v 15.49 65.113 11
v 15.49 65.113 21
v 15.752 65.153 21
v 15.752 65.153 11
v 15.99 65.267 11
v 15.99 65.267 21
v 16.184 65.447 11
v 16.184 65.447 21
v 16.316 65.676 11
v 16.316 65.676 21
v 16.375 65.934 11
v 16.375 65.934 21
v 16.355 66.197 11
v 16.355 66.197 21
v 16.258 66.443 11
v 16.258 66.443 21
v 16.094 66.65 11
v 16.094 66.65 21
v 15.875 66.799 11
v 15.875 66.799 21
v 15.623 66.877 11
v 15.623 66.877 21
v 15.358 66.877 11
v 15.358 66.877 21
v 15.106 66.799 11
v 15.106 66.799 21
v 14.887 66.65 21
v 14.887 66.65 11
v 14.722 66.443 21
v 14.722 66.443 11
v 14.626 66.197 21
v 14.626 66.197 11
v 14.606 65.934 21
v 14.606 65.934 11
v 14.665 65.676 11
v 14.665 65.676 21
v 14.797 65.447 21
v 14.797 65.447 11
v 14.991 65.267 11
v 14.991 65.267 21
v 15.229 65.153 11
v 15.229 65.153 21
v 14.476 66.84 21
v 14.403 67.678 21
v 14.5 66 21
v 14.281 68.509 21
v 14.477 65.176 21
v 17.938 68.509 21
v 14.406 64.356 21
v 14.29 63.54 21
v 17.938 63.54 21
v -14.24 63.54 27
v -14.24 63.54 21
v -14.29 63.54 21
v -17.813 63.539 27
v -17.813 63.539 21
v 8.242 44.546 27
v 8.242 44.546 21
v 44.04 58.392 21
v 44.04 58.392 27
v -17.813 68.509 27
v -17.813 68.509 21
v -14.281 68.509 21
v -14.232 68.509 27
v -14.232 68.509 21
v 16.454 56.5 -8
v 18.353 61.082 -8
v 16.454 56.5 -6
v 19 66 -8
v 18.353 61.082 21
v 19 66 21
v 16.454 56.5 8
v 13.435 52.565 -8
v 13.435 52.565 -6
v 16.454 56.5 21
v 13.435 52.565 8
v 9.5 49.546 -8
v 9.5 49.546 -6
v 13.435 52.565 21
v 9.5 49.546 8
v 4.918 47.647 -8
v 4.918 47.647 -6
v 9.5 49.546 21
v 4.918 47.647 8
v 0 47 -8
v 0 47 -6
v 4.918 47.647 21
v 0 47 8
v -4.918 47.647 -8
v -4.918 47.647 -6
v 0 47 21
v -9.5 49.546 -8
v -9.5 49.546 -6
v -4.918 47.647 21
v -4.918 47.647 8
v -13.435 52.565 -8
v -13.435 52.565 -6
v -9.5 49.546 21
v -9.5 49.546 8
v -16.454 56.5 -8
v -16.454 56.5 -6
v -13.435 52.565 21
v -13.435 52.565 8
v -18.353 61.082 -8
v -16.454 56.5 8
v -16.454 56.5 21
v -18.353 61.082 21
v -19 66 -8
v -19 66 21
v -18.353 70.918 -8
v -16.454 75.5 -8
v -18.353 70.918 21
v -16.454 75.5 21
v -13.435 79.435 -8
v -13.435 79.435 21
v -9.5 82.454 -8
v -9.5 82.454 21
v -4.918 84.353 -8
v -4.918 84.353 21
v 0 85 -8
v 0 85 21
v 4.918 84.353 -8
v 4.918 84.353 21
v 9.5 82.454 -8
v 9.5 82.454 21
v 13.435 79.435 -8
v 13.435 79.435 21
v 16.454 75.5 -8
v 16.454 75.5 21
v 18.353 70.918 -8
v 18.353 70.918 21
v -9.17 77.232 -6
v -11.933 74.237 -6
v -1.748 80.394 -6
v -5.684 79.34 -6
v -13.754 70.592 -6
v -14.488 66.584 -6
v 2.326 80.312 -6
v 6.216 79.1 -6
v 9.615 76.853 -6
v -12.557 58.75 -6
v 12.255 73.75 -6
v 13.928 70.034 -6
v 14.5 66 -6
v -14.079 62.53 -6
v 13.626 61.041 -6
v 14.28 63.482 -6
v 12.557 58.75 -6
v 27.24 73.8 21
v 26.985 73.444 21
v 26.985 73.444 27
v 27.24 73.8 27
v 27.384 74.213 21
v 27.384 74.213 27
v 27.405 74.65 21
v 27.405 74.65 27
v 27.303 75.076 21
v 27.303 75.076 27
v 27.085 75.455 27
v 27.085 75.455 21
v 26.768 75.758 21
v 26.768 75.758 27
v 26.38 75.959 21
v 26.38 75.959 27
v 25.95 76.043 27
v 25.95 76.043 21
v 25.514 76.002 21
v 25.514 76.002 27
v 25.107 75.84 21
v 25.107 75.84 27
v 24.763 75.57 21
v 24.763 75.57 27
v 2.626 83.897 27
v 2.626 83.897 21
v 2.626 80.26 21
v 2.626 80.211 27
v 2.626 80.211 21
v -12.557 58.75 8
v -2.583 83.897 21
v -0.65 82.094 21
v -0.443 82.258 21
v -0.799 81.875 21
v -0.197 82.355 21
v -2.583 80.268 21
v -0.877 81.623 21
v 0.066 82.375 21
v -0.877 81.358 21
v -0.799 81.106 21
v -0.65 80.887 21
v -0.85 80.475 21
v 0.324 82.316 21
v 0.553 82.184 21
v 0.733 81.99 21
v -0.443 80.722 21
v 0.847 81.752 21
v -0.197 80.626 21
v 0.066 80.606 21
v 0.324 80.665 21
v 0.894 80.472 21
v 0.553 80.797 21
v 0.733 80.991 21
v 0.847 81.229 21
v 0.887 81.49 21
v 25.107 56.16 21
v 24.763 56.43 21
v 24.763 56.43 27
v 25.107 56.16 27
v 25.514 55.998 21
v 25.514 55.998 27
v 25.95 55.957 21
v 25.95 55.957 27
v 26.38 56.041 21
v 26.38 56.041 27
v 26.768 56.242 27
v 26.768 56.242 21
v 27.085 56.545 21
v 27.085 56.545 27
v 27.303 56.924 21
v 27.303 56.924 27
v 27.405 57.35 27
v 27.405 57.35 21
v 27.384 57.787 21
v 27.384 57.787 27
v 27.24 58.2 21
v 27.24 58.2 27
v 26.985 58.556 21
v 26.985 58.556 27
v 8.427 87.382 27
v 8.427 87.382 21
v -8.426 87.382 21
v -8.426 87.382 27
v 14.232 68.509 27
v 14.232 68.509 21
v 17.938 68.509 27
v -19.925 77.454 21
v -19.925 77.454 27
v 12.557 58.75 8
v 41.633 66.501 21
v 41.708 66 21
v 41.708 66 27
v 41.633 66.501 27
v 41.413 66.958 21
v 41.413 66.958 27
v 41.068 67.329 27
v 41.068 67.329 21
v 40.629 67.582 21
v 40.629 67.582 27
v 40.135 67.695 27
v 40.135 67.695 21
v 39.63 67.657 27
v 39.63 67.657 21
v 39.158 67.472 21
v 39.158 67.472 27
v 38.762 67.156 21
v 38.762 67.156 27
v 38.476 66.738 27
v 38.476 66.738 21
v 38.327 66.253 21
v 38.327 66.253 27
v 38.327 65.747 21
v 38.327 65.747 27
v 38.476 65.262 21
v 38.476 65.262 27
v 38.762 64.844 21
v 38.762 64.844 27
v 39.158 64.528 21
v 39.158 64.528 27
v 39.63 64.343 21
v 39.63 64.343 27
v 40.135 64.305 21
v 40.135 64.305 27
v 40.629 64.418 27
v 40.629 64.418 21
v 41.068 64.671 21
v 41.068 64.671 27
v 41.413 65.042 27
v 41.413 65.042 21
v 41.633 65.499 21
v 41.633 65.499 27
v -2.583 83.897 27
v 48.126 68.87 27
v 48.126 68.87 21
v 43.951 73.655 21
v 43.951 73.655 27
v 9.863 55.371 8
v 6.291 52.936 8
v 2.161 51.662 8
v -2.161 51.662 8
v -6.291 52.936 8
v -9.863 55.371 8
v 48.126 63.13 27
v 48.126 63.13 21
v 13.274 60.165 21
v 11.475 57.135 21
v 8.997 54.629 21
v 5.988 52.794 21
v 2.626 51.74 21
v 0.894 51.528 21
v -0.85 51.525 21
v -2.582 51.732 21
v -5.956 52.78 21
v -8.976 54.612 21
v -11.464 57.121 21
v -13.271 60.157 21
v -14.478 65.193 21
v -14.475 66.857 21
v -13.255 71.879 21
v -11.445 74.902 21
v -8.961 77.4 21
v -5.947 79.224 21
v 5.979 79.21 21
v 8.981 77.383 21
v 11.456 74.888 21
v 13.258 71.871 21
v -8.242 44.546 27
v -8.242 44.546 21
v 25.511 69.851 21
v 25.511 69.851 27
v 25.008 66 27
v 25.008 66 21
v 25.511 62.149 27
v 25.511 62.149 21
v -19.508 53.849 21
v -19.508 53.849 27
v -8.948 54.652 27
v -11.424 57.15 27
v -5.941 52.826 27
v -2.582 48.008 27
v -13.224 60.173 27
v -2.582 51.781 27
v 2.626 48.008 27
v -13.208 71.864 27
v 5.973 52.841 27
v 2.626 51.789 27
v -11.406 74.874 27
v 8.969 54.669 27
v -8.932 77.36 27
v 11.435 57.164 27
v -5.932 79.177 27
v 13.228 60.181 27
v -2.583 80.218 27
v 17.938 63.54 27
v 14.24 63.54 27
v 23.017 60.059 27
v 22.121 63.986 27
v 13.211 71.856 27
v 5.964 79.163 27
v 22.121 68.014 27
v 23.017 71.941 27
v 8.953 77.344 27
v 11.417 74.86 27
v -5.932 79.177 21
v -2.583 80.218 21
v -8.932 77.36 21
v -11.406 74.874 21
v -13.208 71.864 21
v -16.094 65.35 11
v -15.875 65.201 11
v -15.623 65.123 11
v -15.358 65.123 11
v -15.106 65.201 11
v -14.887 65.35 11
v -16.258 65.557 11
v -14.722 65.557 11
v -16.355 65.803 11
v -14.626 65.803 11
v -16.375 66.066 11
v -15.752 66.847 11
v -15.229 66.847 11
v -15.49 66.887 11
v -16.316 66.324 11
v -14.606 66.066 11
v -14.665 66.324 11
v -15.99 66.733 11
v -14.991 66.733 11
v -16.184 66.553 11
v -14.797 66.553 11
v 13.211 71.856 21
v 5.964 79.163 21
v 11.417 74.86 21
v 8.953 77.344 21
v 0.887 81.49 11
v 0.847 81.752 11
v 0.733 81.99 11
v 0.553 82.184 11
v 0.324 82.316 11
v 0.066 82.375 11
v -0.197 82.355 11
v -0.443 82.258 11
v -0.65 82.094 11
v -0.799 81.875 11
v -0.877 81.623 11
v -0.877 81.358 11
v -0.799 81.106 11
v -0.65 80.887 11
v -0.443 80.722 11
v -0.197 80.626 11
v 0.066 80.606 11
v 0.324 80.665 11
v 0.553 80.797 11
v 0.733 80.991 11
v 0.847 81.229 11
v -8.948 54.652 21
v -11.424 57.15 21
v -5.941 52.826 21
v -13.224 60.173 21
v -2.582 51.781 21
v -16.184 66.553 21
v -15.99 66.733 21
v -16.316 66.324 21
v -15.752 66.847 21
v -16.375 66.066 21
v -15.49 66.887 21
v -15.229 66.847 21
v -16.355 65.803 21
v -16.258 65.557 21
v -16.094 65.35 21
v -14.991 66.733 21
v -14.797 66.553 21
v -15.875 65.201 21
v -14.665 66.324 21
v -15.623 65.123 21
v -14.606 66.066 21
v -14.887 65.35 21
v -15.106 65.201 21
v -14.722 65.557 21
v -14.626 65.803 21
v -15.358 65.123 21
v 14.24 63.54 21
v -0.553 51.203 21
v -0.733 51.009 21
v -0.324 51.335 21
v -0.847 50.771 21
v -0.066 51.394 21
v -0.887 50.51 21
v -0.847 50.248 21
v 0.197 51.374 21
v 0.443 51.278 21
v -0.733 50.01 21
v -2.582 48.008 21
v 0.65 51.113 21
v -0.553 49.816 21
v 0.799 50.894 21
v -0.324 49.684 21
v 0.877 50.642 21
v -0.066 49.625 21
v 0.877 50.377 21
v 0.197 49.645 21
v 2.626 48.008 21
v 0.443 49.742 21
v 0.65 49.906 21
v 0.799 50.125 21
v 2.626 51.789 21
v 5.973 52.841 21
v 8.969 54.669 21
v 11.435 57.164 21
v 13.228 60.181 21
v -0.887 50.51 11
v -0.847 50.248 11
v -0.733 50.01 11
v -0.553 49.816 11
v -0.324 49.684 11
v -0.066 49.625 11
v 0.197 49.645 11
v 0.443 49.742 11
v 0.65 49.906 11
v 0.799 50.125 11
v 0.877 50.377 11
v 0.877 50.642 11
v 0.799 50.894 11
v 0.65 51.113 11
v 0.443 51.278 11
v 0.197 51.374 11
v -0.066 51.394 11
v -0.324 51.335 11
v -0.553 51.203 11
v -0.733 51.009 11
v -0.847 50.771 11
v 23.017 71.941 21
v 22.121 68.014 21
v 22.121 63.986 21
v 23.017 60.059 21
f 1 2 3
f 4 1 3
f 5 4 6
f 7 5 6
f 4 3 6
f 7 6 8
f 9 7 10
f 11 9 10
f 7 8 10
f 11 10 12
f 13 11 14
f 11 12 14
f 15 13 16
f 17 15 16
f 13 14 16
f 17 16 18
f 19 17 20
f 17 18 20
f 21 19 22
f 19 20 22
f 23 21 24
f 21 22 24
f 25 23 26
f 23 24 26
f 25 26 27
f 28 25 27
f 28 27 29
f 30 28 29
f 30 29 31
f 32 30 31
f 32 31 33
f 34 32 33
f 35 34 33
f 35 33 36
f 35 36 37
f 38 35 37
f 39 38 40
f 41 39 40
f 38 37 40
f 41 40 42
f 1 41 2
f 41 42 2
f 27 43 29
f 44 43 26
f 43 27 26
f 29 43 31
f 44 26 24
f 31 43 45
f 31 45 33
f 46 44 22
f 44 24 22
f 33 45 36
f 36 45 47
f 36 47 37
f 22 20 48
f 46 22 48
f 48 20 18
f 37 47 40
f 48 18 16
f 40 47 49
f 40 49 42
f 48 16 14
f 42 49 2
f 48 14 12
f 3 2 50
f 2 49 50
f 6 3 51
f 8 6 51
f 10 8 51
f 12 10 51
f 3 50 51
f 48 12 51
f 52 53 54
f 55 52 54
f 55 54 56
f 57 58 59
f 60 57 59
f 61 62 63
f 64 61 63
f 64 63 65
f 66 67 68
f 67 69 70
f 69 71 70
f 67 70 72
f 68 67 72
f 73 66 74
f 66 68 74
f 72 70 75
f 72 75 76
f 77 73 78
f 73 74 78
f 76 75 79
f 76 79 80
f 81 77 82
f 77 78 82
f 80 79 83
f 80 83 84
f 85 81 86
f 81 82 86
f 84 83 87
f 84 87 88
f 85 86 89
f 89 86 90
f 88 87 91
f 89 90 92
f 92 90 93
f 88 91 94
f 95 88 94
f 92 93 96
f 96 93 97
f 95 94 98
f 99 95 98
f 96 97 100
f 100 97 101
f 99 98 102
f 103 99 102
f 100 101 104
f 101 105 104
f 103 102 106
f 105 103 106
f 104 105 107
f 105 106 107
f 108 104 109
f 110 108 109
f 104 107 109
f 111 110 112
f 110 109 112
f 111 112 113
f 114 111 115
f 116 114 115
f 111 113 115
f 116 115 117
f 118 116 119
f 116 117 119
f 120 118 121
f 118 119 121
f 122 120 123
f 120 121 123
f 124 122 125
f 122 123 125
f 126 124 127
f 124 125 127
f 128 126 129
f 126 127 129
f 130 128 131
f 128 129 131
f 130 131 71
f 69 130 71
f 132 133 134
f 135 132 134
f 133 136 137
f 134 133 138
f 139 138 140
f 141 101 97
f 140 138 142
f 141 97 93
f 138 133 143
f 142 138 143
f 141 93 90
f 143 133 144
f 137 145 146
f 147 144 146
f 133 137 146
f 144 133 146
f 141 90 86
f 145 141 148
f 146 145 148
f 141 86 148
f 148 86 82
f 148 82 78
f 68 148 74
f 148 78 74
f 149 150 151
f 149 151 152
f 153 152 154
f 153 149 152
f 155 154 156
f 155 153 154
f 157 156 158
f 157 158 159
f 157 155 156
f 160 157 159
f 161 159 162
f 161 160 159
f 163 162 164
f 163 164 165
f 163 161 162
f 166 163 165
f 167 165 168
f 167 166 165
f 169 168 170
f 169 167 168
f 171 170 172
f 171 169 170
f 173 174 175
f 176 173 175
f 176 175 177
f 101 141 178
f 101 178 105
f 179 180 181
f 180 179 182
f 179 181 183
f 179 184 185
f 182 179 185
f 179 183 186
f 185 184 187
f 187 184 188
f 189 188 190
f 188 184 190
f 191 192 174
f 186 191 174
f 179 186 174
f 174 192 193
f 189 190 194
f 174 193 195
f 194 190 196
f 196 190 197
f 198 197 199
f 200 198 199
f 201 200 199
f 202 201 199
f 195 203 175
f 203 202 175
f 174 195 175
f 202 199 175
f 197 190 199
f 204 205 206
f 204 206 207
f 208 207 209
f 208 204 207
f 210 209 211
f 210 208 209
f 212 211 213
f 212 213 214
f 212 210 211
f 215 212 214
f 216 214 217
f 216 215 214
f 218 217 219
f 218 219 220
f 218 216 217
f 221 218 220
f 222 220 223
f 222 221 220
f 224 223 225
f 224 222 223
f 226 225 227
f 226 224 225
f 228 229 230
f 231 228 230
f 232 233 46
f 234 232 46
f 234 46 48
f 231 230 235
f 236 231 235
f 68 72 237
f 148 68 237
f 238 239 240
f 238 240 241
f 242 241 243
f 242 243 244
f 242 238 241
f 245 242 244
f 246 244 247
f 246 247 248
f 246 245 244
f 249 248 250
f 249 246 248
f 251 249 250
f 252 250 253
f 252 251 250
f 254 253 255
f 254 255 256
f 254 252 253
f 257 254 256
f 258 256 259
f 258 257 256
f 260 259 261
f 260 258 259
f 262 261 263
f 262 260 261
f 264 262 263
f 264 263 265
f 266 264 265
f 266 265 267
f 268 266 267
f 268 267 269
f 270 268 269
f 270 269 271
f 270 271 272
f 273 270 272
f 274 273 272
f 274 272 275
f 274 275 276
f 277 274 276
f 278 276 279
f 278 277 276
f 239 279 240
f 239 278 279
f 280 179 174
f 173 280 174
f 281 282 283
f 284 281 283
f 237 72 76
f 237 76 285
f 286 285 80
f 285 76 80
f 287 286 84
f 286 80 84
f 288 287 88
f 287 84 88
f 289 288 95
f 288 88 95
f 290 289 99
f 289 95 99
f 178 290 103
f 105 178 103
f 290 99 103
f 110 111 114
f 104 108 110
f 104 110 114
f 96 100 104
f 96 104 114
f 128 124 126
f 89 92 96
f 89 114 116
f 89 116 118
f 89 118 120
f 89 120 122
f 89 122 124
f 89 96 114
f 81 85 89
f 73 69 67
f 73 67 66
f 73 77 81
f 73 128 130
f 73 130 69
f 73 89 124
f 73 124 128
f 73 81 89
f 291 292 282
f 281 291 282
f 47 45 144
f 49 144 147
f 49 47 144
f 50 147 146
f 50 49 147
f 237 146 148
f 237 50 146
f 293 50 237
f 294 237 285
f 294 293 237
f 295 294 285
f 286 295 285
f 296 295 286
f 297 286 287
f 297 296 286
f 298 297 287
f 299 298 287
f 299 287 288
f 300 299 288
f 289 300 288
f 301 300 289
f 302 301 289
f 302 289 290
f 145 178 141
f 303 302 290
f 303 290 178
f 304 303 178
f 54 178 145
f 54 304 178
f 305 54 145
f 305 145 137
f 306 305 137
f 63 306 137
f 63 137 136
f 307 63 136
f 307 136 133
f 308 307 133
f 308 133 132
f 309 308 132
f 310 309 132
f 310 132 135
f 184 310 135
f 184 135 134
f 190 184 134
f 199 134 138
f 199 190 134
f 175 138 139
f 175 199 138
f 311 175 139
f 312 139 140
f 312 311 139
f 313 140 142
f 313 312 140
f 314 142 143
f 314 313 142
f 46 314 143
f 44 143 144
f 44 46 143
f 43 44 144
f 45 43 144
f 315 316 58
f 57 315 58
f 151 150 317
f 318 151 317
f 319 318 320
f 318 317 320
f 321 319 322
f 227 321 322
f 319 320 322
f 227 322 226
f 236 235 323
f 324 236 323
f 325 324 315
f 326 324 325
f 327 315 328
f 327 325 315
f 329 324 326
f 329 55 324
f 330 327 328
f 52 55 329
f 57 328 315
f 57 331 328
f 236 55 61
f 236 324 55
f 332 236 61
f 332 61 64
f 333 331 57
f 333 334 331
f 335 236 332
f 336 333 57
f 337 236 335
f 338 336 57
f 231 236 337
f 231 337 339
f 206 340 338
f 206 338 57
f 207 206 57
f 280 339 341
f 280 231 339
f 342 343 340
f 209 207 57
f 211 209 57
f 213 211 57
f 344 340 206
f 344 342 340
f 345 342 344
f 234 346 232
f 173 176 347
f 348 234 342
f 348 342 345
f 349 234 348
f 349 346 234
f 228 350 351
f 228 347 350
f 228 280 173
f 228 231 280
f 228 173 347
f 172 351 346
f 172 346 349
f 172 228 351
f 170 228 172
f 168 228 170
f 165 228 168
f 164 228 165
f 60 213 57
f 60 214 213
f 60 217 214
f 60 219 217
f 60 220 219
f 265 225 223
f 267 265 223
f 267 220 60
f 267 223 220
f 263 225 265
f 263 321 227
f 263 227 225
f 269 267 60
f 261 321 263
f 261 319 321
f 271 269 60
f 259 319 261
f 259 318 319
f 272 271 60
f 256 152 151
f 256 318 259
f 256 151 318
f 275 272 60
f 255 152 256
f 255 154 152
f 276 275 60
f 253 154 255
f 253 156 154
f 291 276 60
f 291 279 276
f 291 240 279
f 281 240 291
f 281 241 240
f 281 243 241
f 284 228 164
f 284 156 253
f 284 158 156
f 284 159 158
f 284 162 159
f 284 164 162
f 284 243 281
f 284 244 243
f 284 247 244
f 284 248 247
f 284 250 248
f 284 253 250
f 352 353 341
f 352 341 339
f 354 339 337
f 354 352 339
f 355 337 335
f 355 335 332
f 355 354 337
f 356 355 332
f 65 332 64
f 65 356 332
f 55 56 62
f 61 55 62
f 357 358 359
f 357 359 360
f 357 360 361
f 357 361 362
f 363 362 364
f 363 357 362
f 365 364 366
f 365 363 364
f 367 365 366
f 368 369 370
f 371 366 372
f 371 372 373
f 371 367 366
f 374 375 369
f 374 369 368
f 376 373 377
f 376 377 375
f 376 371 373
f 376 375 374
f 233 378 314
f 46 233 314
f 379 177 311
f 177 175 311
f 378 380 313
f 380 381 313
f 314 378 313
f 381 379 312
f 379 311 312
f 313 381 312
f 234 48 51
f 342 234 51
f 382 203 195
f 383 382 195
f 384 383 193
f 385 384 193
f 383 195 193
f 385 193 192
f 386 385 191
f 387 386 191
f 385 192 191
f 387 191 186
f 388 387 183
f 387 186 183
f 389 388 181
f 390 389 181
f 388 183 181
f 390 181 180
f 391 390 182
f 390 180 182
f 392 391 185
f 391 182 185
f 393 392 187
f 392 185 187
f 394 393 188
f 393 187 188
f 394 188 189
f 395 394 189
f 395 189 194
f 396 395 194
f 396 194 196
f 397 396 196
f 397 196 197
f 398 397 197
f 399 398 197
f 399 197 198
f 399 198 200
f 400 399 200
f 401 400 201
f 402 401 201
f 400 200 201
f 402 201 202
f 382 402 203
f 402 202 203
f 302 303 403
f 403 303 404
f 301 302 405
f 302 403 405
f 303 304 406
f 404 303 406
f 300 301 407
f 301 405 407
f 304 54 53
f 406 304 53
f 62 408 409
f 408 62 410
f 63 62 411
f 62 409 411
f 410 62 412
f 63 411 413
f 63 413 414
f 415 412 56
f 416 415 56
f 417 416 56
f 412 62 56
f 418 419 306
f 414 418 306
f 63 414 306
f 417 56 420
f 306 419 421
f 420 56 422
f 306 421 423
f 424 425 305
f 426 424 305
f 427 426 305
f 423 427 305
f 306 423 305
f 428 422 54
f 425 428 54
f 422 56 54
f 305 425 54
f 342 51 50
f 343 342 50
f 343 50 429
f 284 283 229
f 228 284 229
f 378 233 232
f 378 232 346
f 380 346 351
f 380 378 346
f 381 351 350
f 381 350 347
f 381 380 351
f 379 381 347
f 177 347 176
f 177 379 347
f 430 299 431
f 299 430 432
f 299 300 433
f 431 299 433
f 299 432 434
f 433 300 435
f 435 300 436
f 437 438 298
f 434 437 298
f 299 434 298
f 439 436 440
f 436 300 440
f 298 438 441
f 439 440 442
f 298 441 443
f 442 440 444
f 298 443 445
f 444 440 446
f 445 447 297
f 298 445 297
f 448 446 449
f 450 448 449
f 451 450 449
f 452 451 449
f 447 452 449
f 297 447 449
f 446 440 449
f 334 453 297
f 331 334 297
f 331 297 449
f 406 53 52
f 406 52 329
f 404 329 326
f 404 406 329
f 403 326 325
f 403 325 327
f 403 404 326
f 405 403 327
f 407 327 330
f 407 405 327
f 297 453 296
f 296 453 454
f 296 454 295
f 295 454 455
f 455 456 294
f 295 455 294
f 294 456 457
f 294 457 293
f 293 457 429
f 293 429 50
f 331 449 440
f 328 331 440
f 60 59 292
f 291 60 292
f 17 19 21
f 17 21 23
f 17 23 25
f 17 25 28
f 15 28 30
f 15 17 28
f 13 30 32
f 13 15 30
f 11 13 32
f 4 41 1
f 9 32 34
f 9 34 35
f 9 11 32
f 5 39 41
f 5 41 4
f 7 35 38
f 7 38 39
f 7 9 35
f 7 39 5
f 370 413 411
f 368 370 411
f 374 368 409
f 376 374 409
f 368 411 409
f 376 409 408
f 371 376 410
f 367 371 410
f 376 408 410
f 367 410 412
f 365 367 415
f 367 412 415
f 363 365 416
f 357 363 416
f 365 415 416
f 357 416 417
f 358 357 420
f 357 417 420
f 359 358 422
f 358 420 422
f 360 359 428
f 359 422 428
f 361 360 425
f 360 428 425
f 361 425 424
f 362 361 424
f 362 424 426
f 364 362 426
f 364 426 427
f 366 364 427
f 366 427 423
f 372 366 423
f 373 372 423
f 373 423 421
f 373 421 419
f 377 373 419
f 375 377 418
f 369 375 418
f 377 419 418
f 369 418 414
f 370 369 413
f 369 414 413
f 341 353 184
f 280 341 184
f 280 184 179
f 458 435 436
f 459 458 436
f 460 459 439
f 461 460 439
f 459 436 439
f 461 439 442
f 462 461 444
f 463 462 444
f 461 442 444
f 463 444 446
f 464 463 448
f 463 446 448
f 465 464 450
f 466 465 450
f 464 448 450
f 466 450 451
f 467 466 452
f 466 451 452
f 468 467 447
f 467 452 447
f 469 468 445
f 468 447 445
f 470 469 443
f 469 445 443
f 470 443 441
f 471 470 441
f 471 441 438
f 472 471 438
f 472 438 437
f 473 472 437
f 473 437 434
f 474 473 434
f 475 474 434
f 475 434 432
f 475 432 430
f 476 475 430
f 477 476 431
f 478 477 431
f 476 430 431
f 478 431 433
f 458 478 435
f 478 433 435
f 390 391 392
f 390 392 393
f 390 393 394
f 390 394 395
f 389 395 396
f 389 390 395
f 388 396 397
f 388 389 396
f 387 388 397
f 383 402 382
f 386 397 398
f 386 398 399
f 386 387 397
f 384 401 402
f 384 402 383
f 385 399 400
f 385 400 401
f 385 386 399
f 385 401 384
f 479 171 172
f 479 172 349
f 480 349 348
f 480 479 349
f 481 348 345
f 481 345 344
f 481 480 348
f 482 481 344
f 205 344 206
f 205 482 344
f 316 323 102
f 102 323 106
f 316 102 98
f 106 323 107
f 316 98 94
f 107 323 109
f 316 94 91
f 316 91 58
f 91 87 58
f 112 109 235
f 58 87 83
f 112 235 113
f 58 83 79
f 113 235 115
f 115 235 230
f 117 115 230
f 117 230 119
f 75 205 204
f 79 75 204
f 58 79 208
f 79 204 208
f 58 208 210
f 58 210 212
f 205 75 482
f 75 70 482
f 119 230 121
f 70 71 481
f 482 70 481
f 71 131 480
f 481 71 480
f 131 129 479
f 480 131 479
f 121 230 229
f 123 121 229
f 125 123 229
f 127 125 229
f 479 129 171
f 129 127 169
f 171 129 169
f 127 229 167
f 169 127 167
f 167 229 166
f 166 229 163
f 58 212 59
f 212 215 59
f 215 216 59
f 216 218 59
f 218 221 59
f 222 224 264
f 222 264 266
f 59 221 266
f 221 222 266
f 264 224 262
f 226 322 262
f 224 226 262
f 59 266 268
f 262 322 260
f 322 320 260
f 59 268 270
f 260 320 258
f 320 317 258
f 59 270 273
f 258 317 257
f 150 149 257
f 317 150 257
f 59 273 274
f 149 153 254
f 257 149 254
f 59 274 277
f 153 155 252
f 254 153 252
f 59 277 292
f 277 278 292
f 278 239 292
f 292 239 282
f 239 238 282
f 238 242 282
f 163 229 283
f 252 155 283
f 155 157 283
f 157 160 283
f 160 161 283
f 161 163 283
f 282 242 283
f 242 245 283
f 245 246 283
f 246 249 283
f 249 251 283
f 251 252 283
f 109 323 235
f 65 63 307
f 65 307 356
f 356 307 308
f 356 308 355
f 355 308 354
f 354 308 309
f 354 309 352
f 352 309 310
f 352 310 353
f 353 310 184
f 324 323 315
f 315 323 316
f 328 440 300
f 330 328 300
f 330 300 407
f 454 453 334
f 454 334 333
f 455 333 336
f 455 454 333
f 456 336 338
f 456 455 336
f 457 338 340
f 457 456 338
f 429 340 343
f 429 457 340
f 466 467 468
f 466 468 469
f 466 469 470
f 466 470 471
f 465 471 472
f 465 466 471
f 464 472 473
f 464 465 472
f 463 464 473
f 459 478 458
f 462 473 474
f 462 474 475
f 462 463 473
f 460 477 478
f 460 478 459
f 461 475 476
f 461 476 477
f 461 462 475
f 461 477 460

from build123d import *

# Parameters (mm, degrees)
SKETCH122_R           = 1.7
PAD049_DEPTH          = 6
SKETCH123_R           = 19
SKETCH123_R_2         = 14.5
PAD050_DEPTH          = 27
POCKET086_DEPTH       = 14
SKETCH125_R           = 0.886763
POCKET087_DEPTH       = 10
POLARPATTERN004_COUNT = 4
SKETCH150_R           = 19
PAD063_DEPTH          = 2


with BuildPart() as part:
    # Sketch122 → Pad049 (new body)
    with BuildSketch(Plane.XY):
        Polygon((8.427001, 21.382204), (-8.425608, 21.382204), (-19.924648, 11.454167), (-19.507777, -12.150562), (-8.24189, -21.453689), (8.242053, -21.453689), (44.039975, -7.608119), (48.125982, -2.870427), (48.125982, 2.870427), (43.951076, 7.65457), align=None)
        with Locations((40.008084, 0)):
            Circle(SKETCH122_R, mode=Mode.SUBTRACT)
        with BuildLine():
            ThreePointArc((14.231577, 2.509486), (10.260151, 10.176669), (2.625669, 14.210601))
            Line((2.625669, 17.896729), (2.625669, 14.210601))
            Line((-2.582623, 17.896729), (2.625669, 17.896729))
            Line((-2.582682, 14.218476), (-2.582623, 17.896729))
            ThreePointArc((-2.582682, 14.218476), (-10.244752, 10.192172), (-14.231577, 2.509486))
            Line((-17.812584, 2.509486), (-14.231577, 2.509486))
            Line((-17.812584, -2.46093), (-17.812584, 2.509486))
            Line((-14.240297, -2.459525), (-17.812584, -2.46093))
            ThreePointArc((-14.240297, -2.459525), (-10.262224, -10.174579), (-2.581573, -14.218677))
            Line((-2.581573, -17.991852), (-2.581573, -14.218677))
            Line((2.625669, -17.991852), (-2.581573, -17.991852))
            Line((2.625669, -14.210601), (2.625669, -17.991852))
            ThreePointArc((2.625669, -14.210601), (10.277853, -10.158791), (14.240229, -2.459917))
            Line((17.937973, -2.459917), (14.240229, -2.459917))
            Line((17.937973, 2.509486), (17.937973, -2.459917))
            Line((14.231577, 2.509486), (17.937973, 2.509486))
        make_face(mode=Mode.SUBTRACT)
        with BuildLine():
            ThreePointArc((24.762929, 9.570019), (22.008084, 0), (24.762929, -9.570019))
            ThreePointArc((24.762929, -9.570019), (26.937298, -9.618098), (26.985377, -7.443729))
            ThreePointArc((26.985377, 7.443729), (25.008084, 0), (26.985377, -7.443729))
            ThreePointArc((26.985377, 7.443729), (26.937298, 9.618098), (24.762929, 9.570019))
        make_face(mode=Mode.SUBTRACT)
    extrude(amount=PAD049_DEPTH)

    # Sketch123 (on Face32 of Pad049) → Pad050 (join)
    with BuildSketch(Plane(origin=(0, 0, 0), x_dir=(1, 0, 0), z_dir=(0, 0, -1))):
        Circle(SKETCH123_R)
        Circle(SKETCH123_R_2, mode=Mode.SUBTRACT)
    extrude(amount=PAD050_DEPTH)

    # Sketch124 (on Face35 of Pad050) → Pocket086 (cut)
    with BuildSketch(Plane(origin=(0, 0, -27), x_dir=(1, 0, 0), z_dir=(0, 0, -1))):
        Polygon((0, 0), (-42.583396, 24.585535), (42.583396, 24.585535), align=None)
    extrude(amount=-POCKET086_DEPTH, mode=Mode.SUBTRACT)

    # Sketch125 (on Face44 of Pocket086) → Pocket087 (cut)
    with BuildSketch(Plane.XY):
        with Locations((0, 15.490395)):
            Circle(SKETCH125_R)
    pocket087 = extrude(amount=-POCKET087_DEPTH, mode=Mode.SUBTRACT)

    # PolarPattern004: Pocket087 ×4 about axis
    polarpattern004_axis = Axis((0, 0, 0), (0, 0, 1))
    for i in range(1, POLARPATTERN004_COUNT):
        add(pocket087.rotate(polarpattern004_axis, i * 360 / POLARPATTERN004_COUNT), mode=Mode.SUBTRACT)

    # Sketch150 (on Face35 of PolarPattern004) → Pad063 (join)
    with BuildSketch(Plane(origin=(0, 0, -27), x_dir=(1, 0, 0), z_dir=(0, 0, -1))):
        Circle(SKETCH150_R)
    extrude(amount=PAD063_DEPTH)


with BuildPart() as part_1:
    # Body023 placement: moved
    add(part.part.moved(Location((0, 66, 21))))


solid = part_1.part
